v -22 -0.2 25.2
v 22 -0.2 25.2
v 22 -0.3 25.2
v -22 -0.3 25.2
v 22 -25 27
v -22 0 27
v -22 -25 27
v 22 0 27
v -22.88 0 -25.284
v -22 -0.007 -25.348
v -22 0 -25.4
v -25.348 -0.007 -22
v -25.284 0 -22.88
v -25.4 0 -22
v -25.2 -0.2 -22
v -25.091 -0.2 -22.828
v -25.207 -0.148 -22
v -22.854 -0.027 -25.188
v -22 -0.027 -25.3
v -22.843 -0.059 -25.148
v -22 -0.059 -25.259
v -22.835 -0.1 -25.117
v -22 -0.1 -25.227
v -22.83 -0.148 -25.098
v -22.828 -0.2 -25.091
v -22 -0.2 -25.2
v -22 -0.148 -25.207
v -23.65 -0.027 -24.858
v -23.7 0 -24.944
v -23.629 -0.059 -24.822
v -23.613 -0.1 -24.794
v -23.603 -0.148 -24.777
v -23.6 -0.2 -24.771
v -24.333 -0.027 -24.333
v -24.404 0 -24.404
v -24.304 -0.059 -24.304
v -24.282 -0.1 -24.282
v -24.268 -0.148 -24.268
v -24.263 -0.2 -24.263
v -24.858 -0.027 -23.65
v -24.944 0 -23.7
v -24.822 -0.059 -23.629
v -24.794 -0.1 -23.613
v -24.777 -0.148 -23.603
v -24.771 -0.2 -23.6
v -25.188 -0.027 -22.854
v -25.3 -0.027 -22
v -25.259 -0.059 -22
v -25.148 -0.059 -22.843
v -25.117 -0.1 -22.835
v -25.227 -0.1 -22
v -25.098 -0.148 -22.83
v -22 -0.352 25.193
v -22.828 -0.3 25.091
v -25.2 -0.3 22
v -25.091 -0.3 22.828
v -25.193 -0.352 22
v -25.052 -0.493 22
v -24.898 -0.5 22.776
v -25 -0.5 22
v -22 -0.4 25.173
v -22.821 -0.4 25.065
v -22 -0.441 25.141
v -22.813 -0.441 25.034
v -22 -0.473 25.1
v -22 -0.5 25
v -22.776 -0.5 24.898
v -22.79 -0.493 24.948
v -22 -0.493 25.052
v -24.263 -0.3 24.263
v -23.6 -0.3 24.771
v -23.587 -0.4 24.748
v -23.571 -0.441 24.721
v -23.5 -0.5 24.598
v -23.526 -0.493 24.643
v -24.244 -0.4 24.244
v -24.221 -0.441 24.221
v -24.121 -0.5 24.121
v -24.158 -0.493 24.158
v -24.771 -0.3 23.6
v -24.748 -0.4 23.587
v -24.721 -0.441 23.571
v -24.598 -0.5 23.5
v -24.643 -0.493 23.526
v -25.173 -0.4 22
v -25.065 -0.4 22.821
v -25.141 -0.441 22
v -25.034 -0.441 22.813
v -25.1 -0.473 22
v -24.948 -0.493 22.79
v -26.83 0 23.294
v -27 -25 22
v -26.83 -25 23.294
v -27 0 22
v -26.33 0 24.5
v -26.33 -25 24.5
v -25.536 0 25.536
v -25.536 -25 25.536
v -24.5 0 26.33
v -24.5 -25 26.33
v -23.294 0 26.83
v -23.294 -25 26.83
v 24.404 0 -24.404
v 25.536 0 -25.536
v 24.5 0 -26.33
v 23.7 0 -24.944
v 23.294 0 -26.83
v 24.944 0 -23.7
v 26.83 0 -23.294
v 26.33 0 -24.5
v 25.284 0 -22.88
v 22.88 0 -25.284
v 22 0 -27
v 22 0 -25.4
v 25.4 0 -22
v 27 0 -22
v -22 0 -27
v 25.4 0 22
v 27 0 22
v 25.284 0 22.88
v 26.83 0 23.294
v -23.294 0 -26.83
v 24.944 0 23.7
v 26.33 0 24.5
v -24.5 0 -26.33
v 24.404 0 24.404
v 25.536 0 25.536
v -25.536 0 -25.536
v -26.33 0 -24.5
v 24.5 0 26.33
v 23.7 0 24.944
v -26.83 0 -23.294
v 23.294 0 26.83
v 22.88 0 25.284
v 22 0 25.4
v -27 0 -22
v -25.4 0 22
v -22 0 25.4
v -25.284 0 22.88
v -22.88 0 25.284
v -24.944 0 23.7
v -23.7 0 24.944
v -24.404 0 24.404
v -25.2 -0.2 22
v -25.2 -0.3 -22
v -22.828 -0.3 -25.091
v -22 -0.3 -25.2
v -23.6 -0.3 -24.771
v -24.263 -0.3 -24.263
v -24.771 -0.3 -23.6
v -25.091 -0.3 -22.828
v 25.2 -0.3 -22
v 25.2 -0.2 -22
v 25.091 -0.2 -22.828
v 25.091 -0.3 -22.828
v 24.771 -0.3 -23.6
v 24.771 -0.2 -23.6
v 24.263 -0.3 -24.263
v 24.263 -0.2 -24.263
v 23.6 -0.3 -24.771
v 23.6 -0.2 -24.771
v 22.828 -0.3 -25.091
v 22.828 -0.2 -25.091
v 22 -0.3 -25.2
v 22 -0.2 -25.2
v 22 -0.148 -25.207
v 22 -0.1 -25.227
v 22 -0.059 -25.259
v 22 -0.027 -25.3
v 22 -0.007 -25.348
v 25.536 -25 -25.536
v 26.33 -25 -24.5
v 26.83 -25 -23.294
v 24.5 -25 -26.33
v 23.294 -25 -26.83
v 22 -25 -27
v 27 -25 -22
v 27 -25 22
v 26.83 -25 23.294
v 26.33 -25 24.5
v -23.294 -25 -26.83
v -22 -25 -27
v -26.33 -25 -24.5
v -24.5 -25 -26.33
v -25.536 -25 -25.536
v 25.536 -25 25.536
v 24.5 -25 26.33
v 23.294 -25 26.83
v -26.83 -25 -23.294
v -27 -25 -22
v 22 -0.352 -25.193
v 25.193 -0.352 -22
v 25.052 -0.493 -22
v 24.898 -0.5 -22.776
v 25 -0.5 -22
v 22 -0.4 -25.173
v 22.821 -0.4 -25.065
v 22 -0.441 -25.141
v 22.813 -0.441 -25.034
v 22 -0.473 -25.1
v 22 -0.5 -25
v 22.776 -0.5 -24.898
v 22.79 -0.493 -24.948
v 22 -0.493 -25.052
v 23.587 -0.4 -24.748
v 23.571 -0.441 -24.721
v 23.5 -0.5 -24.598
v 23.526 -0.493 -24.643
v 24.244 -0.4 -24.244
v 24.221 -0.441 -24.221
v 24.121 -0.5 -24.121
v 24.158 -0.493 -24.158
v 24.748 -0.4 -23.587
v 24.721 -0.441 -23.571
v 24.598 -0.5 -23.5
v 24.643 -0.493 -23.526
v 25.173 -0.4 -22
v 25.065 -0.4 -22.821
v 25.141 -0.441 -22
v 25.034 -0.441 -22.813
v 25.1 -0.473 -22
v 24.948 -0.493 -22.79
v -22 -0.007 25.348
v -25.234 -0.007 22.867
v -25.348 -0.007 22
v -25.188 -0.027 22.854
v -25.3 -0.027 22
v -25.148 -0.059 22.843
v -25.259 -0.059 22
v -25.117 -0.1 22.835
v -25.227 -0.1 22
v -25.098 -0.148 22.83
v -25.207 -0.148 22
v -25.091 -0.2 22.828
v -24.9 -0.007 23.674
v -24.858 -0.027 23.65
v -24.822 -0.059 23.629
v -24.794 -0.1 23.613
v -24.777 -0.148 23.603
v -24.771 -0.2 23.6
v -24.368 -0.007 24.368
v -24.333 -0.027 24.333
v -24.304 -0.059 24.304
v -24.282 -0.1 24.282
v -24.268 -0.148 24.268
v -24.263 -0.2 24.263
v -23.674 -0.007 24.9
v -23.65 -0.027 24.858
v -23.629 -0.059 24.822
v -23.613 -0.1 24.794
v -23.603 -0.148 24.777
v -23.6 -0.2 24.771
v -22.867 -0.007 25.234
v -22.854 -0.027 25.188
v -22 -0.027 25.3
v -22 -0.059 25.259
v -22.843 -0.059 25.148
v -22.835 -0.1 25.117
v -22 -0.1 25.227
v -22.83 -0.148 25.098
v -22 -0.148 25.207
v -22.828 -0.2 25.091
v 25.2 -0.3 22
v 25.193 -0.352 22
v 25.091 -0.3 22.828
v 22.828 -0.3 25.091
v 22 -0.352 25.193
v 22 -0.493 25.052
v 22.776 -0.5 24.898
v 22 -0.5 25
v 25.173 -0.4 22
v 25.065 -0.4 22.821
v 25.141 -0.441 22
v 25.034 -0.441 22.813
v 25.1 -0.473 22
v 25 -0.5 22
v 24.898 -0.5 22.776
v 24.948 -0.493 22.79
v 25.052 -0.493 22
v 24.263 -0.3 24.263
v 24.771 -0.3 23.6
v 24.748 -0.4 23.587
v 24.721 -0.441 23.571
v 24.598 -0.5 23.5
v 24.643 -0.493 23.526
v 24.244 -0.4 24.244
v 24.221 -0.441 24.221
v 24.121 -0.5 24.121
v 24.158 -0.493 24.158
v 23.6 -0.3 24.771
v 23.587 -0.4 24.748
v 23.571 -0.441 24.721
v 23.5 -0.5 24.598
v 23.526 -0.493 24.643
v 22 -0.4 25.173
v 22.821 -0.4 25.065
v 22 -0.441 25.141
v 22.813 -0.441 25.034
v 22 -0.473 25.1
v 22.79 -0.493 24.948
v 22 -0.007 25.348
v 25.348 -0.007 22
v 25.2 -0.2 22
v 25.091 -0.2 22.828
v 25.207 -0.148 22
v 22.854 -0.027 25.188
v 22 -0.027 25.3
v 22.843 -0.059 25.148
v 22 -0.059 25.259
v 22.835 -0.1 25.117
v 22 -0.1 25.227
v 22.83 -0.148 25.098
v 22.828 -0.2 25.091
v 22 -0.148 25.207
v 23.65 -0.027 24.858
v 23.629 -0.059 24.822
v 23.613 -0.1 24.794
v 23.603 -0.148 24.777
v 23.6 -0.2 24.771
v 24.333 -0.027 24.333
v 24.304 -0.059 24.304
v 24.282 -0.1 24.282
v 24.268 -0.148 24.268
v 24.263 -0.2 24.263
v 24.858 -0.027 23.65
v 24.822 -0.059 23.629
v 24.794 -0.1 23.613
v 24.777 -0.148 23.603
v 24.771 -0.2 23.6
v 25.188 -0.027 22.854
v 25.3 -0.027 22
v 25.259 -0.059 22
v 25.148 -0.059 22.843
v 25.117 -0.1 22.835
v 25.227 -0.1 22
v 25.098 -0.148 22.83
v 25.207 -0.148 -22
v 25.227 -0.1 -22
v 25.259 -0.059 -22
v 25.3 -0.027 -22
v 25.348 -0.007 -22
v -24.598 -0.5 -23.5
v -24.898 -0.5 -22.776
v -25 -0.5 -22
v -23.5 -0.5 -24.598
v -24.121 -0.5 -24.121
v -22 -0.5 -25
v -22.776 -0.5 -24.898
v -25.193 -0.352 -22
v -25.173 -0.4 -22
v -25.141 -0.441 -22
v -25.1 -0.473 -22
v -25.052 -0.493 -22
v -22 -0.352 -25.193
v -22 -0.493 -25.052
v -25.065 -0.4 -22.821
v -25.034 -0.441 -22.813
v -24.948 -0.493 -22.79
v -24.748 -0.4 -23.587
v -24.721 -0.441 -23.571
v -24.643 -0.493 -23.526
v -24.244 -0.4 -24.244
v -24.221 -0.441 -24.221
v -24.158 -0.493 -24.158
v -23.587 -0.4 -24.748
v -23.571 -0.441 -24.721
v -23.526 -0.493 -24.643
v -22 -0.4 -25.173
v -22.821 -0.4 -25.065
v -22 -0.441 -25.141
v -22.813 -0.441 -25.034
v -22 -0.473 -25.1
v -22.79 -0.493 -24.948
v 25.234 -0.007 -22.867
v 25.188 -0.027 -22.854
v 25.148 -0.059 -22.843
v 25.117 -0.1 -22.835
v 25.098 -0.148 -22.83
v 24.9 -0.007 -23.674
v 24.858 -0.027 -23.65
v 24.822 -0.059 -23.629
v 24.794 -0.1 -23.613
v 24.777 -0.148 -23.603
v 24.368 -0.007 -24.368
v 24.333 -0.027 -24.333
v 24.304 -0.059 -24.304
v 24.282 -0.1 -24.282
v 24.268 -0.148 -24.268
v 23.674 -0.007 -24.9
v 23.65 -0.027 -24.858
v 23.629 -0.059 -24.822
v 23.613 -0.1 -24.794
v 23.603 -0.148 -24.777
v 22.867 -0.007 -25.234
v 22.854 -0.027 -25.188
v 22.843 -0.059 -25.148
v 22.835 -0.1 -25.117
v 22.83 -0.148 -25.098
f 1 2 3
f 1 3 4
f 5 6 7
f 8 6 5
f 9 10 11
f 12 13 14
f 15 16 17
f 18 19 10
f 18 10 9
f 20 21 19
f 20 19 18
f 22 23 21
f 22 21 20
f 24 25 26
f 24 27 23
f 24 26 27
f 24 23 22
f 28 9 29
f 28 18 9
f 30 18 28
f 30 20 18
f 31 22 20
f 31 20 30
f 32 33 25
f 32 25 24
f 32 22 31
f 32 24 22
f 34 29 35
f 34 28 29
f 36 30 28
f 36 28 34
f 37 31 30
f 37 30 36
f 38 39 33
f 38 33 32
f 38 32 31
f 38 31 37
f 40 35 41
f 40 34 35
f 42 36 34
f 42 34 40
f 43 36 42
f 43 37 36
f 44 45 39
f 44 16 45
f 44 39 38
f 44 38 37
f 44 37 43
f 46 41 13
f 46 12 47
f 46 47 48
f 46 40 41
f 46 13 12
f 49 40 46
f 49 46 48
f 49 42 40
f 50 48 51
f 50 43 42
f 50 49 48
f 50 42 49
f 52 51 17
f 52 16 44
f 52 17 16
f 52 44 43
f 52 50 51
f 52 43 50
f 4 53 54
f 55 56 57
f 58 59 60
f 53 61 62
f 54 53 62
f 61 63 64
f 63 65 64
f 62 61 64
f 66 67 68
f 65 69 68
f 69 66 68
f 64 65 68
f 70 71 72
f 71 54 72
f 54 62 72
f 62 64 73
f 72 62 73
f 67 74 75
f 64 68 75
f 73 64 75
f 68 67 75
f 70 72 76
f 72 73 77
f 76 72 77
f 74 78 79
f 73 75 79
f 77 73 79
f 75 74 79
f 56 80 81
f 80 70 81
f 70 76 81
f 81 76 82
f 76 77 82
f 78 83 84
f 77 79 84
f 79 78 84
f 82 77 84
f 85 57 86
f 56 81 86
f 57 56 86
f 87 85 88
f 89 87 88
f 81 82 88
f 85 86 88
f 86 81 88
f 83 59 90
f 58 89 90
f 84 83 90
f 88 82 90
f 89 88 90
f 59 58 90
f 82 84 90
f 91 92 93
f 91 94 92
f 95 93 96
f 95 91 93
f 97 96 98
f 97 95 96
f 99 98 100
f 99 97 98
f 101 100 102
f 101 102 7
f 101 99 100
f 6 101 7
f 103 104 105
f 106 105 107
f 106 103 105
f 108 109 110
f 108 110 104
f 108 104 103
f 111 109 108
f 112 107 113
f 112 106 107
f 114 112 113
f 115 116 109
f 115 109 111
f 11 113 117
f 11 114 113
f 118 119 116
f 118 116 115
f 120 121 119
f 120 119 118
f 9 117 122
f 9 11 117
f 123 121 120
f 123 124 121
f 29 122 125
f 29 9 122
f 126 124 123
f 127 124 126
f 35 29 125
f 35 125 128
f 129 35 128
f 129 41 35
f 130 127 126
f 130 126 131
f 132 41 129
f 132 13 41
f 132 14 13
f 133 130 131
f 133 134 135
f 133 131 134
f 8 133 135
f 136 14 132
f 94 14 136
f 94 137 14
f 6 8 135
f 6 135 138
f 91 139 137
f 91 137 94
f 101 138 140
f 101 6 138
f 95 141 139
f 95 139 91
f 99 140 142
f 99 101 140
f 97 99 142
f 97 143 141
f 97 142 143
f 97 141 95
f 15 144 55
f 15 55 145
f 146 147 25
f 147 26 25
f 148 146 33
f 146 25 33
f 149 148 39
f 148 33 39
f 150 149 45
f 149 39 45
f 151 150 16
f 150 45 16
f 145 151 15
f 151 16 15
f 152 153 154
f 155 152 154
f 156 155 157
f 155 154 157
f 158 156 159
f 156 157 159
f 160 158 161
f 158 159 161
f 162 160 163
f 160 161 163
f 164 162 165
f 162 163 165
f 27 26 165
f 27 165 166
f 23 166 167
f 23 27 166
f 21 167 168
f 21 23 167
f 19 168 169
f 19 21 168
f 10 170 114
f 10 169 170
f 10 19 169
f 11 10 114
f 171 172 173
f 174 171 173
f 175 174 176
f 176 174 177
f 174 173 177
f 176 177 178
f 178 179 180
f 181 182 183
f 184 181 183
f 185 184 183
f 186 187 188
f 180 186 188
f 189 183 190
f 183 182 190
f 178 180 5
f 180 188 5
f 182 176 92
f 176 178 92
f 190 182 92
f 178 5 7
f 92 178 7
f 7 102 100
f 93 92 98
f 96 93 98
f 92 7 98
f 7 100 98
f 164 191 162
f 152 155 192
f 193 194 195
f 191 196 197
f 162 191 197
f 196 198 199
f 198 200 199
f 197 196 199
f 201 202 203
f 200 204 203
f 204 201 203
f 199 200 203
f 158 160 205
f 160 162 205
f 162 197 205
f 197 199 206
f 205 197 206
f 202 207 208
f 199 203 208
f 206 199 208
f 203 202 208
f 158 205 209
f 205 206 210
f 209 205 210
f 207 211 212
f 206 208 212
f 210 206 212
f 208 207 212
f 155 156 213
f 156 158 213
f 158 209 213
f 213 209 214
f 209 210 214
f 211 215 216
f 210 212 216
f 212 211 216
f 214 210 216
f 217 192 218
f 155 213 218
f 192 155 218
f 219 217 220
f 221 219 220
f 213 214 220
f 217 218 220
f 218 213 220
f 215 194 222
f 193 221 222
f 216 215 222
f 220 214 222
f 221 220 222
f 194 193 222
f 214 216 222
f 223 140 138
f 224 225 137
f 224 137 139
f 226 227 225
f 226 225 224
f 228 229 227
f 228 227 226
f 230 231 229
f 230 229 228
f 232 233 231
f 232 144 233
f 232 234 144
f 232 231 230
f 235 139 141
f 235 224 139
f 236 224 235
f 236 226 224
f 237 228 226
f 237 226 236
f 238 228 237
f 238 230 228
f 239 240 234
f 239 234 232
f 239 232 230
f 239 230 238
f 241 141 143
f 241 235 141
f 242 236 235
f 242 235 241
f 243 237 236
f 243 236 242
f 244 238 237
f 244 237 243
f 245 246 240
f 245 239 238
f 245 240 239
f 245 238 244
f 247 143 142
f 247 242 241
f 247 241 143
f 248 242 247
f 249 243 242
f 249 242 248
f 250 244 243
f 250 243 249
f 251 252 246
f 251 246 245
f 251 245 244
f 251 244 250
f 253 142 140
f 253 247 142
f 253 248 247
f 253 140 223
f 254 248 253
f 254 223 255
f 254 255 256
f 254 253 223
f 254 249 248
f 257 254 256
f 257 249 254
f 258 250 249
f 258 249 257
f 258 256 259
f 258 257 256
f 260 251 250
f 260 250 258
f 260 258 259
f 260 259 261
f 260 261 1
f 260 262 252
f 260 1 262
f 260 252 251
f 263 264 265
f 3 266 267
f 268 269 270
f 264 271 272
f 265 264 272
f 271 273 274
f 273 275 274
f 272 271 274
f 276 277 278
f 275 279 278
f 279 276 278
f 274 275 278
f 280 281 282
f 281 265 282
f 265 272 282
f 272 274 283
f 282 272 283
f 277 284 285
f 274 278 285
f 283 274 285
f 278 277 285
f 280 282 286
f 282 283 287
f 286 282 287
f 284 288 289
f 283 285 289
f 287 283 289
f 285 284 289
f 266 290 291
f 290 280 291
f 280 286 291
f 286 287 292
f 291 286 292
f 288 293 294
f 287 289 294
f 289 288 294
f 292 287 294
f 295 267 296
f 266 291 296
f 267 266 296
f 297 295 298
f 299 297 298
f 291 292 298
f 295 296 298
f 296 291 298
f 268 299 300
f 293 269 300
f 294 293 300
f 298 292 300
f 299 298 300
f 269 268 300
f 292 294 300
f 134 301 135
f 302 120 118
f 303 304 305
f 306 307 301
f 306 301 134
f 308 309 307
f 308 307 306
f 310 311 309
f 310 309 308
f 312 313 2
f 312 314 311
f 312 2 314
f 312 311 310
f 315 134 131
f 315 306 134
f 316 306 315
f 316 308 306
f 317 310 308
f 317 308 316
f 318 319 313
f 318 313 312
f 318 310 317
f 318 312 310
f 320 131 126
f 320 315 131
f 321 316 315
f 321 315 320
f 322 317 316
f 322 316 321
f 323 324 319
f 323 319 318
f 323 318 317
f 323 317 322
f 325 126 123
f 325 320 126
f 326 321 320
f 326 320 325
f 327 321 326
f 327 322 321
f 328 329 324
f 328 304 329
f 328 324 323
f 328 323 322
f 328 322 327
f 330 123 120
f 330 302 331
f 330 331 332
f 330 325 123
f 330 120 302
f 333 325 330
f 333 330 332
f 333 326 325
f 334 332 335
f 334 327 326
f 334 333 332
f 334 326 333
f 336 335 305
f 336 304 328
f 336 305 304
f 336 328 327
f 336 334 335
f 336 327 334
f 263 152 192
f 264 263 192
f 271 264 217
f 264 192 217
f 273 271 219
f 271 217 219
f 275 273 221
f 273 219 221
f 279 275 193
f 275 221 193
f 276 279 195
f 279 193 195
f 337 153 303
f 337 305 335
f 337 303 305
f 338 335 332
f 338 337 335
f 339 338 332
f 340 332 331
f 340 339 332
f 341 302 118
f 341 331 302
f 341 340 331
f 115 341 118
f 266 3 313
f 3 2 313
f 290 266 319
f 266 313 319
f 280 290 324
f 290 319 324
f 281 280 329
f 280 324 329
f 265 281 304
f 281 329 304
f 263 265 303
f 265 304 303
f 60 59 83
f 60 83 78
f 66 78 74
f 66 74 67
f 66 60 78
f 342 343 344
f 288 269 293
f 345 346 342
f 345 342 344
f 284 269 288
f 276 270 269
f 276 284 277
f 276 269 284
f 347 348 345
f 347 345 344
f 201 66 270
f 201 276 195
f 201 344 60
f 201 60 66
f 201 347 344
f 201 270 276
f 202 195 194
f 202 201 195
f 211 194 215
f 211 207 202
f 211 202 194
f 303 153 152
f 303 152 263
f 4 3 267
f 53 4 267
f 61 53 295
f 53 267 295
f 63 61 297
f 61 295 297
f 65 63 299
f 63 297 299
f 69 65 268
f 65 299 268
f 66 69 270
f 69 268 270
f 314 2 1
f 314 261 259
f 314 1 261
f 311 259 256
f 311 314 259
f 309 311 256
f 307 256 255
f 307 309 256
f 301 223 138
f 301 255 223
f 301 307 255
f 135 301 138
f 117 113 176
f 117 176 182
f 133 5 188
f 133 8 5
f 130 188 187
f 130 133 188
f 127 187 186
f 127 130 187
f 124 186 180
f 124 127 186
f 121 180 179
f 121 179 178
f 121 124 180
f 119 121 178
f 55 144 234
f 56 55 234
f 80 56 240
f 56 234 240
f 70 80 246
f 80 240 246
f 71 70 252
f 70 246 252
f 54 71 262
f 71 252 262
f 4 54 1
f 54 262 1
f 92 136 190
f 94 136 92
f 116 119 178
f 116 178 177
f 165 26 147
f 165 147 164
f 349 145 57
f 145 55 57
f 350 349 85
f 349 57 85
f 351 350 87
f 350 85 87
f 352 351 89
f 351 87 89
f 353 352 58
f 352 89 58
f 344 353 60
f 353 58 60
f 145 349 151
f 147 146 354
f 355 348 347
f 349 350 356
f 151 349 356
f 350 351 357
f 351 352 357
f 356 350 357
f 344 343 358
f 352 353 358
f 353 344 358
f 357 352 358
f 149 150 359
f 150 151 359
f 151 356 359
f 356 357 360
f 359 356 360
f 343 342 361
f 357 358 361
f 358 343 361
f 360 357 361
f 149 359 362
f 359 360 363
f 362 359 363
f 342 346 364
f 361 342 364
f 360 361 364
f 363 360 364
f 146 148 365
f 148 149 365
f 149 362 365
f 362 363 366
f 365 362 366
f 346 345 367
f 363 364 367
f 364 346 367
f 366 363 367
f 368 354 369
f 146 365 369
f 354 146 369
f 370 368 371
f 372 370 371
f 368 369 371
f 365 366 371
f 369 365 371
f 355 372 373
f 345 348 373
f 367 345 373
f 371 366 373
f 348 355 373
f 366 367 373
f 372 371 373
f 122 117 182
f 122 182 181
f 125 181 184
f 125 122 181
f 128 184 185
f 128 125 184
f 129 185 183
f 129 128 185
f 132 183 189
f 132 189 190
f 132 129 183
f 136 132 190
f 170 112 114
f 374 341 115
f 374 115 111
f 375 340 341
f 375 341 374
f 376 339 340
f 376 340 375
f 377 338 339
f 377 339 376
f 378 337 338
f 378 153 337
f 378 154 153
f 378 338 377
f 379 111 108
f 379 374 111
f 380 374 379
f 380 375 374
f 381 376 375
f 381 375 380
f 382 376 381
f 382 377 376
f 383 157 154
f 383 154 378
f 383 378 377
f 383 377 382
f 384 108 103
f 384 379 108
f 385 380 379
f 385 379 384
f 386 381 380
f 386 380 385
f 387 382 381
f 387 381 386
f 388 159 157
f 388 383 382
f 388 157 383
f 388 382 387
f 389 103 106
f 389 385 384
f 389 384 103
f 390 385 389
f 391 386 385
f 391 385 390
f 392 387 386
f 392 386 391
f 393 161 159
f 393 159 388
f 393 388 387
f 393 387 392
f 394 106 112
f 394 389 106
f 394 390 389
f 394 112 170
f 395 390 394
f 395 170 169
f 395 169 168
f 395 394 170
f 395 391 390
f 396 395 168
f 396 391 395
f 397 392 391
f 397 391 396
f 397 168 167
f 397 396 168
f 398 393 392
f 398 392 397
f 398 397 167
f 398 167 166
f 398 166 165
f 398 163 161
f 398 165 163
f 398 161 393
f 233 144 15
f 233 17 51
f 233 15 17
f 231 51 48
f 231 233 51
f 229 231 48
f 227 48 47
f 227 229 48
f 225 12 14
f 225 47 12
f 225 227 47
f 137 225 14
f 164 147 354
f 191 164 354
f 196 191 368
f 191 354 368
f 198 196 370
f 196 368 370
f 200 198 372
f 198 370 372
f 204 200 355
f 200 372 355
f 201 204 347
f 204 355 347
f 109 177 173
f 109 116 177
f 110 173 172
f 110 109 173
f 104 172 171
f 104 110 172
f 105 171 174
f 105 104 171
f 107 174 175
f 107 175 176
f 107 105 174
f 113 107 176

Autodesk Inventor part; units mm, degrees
ref_plane "YZ Plane" through (0, 0, 0) normal (1, 0, 0) x (0, 1, 0)
ref_plane "XZ Plane" through (0, 0, 0) normal (0, 1, 0) x (-1, 0, 0)
ref_plane "XY Plane" through (0, 0, 0) normal (0, 0, 1) x (1, 0, 0)
sketch "Sketch1" plane through (0, 0, 0) normal (0, 1, 0) x (-1, 0, 0)
  line L0 (50, 0) -> (-50, 0)
  line L1 (0, 50) -> (0, -50)
  line L2 (22, 27) -> (-22, 27)
  arc A0 (-22, 27) -> (-27, 22) centre (-22, 22) ccw
  line L3 (-27, 22) -> (-27, -22)
  arc A1 (-27, -22) -> (-22, -27) centre (-22, -22) ccw
  line L4 (-22, -27) -> (22, -27)
  arc A2 (22, -27) -> (27, -22) centre (22, -22) ccw
  line L5 (27, -22) -> (27, 22)
  arc A3 (27, 22) -> (22, 27) centre (22, 22) ccw
  point P0 (0, 0)
  dimension "d0" = 100
  dimension "d1" = 100
  dimension "core_outer_width" = 54
  dimension "core_outer_radius" = 5
extrude "Extrusion1" add sketch "Sketch1" against normal blind 25
sketch "Sketch2" plane through (0, 0, 0) normal (0, 1, 0) x (1, 0, 0)
  line L0 (-27, 22) -> (-27, -22) construction
  arc A0 (-27, -22) -> (-22, -27) centre (-22, -22) ccw construction
  line L1 (-22, -27) -> (22, -27) construction
  arc A1 (22, -27) -> (27, -22) centre (22, -22) ccw construction
  line L2 (27, -22) -> (27, 22) construction
  arc A2 (27, 22) -> (22, 27) centre (22, 22) ccw construction
  line L3 (22, 27) -> (-22, 27) construction
  arc A3 (-22, 27) -> (-27, 22) centre (-22, 22) ccw construction
  line L4 (22, -25.2) -> (-22, -25.2)
  arc A4 (-25.2, -22) -> (-22, -25.2) centre (-22, -22) ccw
  line L5 (-25.2, -22) -> (-25.2, 22)
  arc A5 (-22, 25.2) -> (-25.2, 22) centre (-22, 22) ccw
  line L6 (-22, 25.2) -> (22, 25.2)
  arc A6 (25.2, 22) -> (22, 25.2) centre (22, 22) ccw
  line L7 (25.2, 22) -> (25.2, -22)
  arc A7 (22, -25.2) -> (25.2, -22) centre (22, -22) ccw
  point P0 (0, 0)
  dimension "d6" = 1.8
extrude "Extrusion2" cut sketch "Sketch2" against normal blind 0.5
fillet "Fillet1" radius 0.2 16 edges at (-24.2627, -0.5, -24.2627) (0, -0.5, -25.2) (24.2627, -0.5, -24.2627) (25.2, -0.5, 0) (24.2627, -0.5, 24.2627) (0, -0.5, 25.2) (-24.2627, -0.5, 24.2627) (-25.2, -0.5, 0) (-24.2627, 0, -24.2627) (0, 0, -25.2) (24.2627, 0, -24.2627) (25.2, 0, 0) (24.2627, 0, 24.2627) (0, 0, 25.2) (-24.2627, 0, 24.2627) (-25.2, 0, 0)
equation "\"d6\" = -0.5 * core_inner_width + 0.5 * core_outer_width"
equation "\"core_inner_width\" = 50.4"
properties part number "core_dummy_1"
